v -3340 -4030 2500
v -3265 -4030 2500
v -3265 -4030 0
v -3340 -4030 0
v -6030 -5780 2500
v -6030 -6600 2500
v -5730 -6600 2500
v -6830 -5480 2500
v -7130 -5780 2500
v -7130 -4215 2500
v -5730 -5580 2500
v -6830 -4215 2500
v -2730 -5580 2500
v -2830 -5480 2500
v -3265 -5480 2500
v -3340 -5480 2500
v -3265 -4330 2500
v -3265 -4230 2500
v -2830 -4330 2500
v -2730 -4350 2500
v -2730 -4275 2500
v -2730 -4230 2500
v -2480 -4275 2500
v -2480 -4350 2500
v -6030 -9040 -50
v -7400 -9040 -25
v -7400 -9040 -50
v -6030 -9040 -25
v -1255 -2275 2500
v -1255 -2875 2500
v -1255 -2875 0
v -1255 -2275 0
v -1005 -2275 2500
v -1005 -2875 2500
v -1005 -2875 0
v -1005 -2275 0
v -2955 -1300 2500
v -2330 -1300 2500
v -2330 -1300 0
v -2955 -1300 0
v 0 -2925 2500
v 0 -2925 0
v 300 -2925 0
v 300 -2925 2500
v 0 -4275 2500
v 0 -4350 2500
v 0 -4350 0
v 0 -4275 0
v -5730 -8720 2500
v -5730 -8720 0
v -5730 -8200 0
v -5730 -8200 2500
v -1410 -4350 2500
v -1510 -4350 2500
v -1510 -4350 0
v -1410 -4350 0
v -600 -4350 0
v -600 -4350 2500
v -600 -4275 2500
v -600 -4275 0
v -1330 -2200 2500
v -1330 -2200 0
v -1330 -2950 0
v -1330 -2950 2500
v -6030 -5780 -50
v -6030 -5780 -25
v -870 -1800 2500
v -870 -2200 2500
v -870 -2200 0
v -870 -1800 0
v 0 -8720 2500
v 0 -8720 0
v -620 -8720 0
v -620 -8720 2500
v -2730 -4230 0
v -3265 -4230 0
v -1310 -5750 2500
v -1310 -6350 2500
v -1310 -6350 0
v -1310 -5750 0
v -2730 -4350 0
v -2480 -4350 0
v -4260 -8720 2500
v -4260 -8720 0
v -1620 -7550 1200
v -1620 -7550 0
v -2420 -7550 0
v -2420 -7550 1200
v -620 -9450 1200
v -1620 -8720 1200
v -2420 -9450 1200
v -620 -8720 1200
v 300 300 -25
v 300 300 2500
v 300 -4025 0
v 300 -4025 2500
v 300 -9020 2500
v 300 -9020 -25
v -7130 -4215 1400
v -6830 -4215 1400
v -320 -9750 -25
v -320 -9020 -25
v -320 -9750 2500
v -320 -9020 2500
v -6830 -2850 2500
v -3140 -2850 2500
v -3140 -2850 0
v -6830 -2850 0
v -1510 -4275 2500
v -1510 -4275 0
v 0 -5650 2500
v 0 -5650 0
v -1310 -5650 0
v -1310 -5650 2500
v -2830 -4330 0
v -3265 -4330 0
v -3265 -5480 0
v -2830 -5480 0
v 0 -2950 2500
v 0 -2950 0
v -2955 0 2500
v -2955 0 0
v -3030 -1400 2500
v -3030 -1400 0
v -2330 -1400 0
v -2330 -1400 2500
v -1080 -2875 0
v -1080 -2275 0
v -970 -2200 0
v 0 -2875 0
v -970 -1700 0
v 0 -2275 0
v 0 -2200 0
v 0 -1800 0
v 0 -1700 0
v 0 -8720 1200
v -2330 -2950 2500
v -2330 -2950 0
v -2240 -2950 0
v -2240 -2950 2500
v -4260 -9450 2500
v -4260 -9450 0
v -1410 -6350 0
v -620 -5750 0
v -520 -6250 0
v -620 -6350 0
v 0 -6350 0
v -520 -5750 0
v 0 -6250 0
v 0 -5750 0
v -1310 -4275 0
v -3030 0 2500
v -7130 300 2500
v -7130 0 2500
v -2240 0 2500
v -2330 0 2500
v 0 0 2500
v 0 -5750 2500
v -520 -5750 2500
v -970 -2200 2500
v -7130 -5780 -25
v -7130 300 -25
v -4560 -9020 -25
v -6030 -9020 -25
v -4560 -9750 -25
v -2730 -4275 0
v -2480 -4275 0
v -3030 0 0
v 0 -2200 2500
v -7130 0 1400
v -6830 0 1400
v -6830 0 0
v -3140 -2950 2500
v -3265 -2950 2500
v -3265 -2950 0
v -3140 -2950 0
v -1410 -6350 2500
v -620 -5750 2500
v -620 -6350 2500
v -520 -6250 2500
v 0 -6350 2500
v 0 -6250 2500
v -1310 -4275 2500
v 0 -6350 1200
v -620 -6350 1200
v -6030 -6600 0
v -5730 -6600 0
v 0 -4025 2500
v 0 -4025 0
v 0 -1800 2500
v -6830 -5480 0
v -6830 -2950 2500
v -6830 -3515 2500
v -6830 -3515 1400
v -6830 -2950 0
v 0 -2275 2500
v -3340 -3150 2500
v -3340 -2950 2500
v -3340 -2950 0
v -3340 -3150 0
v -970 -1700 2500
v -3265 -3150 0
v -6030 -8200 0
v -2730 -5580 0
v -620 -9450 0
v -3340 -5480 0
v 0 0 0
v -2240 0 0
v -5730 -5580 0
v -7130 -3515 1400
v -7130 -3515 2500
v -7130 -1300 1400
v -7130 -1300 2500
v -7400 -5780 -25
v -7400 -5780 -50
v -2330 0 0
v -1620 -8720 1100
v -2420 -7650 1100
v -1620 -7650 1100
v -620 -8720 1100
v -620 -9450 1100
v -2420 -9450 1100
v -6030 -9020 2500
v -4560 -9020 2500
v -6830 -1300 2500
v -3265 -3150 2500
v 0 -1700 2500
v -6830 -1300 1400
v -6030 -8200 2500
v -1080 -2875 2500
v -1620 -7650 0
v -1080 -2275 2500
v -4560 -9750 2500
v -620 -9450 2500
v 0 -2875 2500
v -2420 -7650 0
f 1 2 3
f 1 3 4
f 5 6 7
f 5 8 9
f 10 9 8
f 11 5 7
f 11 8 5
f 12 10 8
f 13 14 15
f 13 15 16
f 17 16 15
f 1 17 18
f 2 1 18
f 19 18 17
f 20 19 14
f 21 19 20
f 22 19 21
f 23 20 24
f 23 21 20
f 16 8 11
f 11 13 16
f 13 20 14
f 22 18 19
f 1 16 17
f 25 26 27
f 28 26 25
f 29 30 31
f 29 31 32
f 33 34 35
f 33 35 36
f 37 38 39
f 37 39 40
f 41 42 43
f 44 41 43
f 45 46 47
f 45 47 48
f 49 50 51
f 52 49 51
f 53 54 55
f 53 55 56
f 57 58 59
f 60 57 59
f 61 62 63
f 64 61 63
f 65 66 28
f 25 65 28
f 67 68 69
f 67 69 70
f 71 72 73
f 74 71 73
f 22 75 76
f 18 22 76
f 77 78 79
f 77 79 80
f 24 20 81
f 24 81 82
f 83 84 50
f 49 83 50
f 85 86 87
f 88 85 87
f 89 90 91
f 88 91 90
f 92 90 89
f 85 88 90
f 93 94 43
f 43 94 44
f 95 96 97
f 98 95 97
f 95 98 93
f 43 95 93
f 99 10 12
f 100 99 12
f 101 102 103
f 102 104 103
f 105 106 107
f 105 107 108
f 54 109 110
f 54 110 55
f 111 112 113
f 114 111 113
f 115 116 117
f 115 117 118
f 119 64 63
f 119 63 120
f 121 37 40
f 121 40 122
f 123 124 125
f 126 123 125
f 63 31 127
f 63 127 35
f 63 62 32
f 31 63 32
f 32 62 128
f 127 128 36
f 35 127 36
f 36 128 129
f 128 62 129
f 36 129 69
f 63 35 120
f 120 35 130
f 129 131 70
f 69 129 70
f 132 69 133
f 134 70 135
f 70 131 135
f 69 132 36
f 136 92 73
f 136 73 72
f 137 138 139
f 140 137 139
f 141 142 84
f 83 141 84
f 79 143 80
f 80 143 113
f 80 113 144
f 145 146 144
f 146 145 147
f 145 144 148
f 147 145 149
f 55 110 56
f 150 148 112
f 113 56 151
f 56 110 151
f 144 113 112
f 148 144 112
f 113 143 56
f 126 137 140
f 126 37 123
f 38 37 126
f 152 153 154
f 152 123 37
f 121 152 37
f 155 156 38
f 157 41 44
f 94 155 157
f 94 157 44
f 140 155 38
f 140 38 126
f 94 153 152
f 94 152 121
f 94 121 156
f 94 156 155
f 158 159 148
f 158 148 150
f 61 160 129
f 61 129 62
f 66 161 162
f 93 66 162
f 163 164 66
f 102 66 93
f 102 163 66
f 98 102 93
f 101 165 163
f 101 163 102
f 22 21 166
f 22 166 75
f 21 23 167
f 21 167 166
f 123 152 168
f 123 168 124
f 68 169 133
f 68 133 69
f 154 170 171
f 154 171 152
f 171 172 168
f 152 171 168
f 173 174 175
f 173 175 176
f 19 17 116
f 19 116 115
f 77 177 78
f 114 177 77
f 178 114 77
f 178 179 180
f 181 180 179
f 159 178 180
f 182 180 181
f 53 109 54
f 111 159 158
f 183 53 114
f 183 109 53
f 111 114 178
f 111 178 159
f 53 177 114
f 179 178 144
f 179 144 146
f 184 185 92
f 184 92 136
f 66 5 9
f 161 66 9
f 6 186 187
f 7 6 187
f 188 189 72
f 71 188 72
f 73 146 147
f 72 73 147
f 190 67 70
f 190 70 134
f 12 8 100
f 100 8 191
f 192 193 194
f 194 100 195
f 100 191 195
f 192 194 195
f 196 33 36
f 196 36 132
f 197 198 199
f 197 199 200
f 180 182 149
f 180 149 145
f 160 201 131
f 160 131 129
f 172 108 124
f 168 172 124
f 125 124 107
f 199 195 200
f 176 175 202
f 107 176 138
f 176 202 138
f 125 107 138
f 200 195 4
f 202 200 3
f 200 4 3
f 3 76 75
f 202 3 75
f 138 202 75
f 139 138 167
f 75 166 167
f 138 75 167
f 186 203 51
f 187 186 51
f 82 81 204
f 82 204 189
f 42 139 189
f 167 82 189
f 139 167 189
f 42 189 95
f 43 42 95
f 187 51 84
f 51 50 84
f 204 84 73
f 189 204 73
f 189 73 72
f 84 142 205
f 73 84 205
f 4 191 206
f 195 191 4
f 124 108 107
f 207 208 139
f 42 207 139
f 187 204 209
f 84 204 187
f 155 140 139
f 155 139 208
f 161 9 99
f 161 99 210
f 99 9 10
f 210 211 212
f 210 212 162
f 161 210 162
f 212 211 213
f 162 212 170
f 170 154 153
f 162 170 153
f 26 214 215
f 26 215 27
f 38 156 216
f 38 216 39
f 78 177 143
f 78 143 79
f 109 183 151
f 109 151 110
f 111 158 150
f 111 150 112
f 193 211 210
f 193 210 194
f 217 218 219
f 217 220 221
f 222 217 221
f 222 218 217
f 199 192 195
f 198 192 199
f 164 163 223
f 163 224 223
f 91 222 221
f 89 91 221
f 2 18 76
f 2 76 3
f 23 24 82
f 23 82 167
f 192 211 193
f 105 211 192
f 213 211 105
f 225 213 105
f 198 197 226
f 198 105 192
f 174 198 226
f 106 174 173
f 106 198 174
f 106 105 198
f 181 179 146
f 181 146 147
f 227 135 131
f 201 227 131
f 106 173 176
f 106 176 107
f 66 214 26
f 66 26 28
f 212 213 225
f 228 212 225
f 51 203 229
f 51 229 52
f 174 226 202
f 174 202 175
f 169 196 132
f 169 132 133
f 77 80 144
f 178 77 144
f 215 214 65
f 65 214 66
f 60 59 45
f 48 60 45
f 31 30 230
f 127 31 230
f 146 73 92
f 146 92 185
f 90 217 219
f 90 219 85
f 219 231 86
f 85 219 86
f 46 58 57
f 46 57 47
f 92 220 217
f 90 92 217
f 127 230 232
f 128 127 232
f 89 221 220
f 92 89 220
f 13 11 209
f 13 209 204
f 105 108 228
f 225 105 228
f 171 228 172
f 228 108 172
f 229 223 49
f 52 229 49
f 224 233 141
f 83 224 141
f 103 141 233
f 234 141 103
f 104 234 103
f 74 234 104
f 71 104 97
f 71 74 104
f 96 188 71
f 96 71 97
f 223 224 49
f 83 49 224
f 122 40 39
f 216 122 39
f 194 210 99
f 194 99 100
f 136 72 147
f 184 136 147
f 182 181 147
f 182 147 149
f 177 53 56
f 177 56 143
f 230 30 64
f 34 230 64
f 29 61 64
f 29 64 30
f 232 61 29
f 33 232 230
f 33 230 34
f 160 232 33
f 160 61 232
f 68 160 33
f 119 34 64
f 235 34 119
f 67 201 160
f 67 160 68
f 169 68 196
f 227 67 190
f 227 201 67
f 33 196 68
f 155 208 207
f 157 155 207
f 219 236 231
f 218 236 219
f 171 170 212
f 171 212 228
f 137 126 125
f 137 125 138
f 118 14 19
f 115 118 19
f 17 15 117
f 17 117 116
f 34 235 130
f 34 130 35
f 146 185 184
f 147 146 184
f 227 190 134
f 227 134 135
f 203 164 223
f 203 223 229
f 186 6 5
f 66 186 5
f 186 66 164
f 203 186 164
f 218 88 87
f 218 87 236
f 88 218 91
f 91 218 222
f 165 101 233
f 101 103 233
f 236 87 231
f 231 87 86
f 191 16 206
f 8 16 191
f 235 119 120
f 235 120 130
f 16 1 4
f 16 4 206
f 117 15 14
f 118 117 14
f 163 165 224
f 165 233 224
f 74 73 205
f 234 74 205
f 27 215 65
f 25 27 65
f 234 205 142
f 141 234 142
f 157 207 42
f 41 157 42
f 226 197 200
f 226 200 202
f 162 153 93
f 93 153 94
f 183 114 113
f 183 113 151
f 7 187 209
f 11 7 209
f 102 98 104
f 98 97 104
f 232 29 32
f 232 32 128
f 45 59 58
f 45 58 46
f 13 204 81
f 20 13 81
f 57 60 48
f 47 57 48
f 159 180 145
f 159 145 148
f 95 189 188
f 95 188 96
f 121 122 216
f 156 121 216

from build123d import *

# Parameters (mm, degrees)
F1_DEPTH  = 2500
F3_DEPTH  = 25
F4_W      = 1370
F4_H      = 3260
F5_DEPTH  = 25
F6_W      = 435
F6_H      = 1150
F7_DEPTH  = 2500
F9_DEPTH  = 2500
F8_W      = 600
F8_H      = 75
F8_W_2    = 175
F8_H_2    = 600
F10_W     = 300
F10_H     = 1600
F10_H_2   = 1100
F11_DEPTH = 2500
F10_H_3   = 700
F10_H_4   = 1300
F12_DEPTH = 1100
F13_W     = 620
F13_H     = 2370
F14_DEPTH = 1200
F15_W     = 1800
F15_H     = 1100
F16_DEPTH = 1800.001


with BuildPart() as f1:
    # F0 (on Top) → F1 (new body)
    with BuildSketch(Plane.XY):
        Polygon((300, 300), (-7130, 300), (-7130, -5780), (-6030, -5780), (-6030, -9020), (-4560, -9020), (-4560, -9750), (-320, -9750), (-320, -9020), (300, -9020), align=None)
        Polygon((-6830, 0), (0, 0), (0, -8720), (-620, -8720), (-620, -9450), (-4260, -9450), (-4260, -8720), (-5730, -8720), (-5730, -5480), (-6830, -5480), align=None, mode=Mode.SUBTRACT)
    extrude(amount=F1_DEPTH)

    # F2 (on face) → F3 (join)
    with BuildSketch(Plane(origin=(0, 0, 0), x_dir=(1, 0, 0), z_dir=(0, 0, -1))):
        Polygon((-7130, 5780), (-7130, -300), (300, -300), (300, 9020), (-320, 9020), (-320, 9750), (-4560, 9750), (-4560, 9020), (-6030, 9020), (-6030, 5780), align=None)
    extrude(amount=F3_DEPTH)

    # F6 (on face) → F7 (join, through all)
    with BuildSketch(Plane.XY.offset(2500)):
        Polygon((-6830, -2850), (-6830, -2950), (-3340, -2950), (-3340, -3150), (-3265, -3150), (-3265, -2950), (-3140, -2950), (-3140, -2850), align=None)
        Polygon((-3340, -5480), (-5730, -5480), (-5730, -5580), (-2730, -5580), (-2730, -4350), (-2480, -4350), (-2480, -4275), (-2730, -4275), (-2730, -4230), (-3265, -4230), (-3265, -4030), (-3340, -4030), (-3340, -4230), align=None)
        with Locations((-3047.5, -4905)):
            Rectangle(F6_W, F6_H, mode=Mode.SUBTRACT)
        Polygon((-2240, 0), (-2330, 0), (-2330, -1300), (-2955, -1300), (-2955, 0), (-3030, 0), (-3030, -1400), (-2330, -1400), (-2330, -2950), (-2240, -2950), align=None)
    extrude(amount=-F7_DEPTH)

    # F10 (on face) → F11 (cut)
    with BuildSketch(Plane.XY.offset(2500)):
        with Locations((-5880, -7400)):
            Rectangle(F10_W, F10_H)
        with Locations((150, -3475)):
            Rectangle(F10_W, F10_H_2)
    extrude(amount=-F11_DEPTH, mode=Mode.SUBTRACT)

    # F10 (on face) → F12 (cut)
    with BuildSketch(Plane.XY.offset(2500)):
        with Locations((150, -3475)):
            Rectangle(F10_W, F10_H_2)
        with Locations((-5880, -7400)):
            Rectangle(F10_W, F10_H)
        with Locations((-6980, -3865)):
            Rectangle(F10_W, F10_H_3)
        with Locations((-6980, -650)):
            Rectangle(F10_W, F10_H_4)
    extrude(amount=-F12_DEPTH, mode=Mode.SUBTRACT)


with BuildPart() as f5:
    # F4 (on face) → F5 (new body)
    with BuildSketch(Plane(origin=(0, 0, -25), x_dir=(1, 0, 0), z_dir=(0, 0, -1))):
        with Locations((-6715, 7410)):
            Rectangle(F4_W, F4_H)
    extrude(amount=F5_DEPTH)


with BuildPart() as f9:
    # F8 (on face) → F9 (new body, through all)
    with BuildSketch(Plane.XY.offset(2500)):
        Polygon((-620, -6350), (0, -6350), (0, -6250), (-520, -6250), (-520, -5750), (0, -5750), (0, -5650), (-1310, -5650), (-1310, -4275), (-1510, -4275), (-1510, -4350), (-1410, -4350), (-1410, -6350), (-1310, -6350), (-1310, -5750), (-620, -5750), align=None)
    extrude(amount=-F9_DEPTH)


with BuildPart() as f9b:
    # F8 (on face) → F9, piece 2 (new body, through all)
    with BuildSketch(Plane.XY.offset(2500)):
        with Locations((-300, -4312.5)):
            Rectangle(F8_W, F8_H)
    extrude(amount=-F9_DEPTH)


with BuildPart() as f9c:
    # F8 (on face) → F9, piece 3 (new body, through all)
    with BuildSketch(Plane.XY.offset(2500)):
        Polygon((-1005, -2275), (0, -2275), (0, -2200), (-870, -2200), (-870, -1800), (0, -1800), (0, -1700), (-970, -1700), (-970, -2200), (-1330, -2200), (-1330, -2950), (0, -2950), (0, -2875), (-1005, -2875), align=None)
        with Locations((-1167.5, -2575)):
            Rectangle(F8_W_2, F8_H_2, mode=Mode.SUBTRACT)
    extrude(amount=-F9_DEPTH)


with BuildPart() as f14:
    # F13 (on face) → F14 (new body)
    with BuildSketch(Plane.XY):
        with Locations((-310, -7535)):
            Rectangle(F13_W, F13_H)
    extrude(amount=F14_DEPTH)


with BuildPart() as f14b:
    # F13 (on face) → F14, piece 2 (new body)
    with BuildSketch(Plane.XY):
        Polygon((-620, -9450), (-620, -8720), (-1620, -8720), (-1620, -7550), (-2420, -7550), (-2420, -9450), align=None)
    extrude(amount=F14_DEPTH)

    # F15 (on face) → F16 (cut, through all)
    with BuildSketch(Plane(origin=(-2420, 0, 0), x_dir=(0, -1, 0), z_dir=(-1, 0, 0))):
        with Locations((8550, 550)):
            Rectangle(F15_W, F15_H)
    extrude(amount=-F16_DEPTH, mode=Mode.SUBTRACT)


solid = Compound([f1.part, f5.part, f9.part, f9b.part, f9c.part, f14.part, f14b.part])
